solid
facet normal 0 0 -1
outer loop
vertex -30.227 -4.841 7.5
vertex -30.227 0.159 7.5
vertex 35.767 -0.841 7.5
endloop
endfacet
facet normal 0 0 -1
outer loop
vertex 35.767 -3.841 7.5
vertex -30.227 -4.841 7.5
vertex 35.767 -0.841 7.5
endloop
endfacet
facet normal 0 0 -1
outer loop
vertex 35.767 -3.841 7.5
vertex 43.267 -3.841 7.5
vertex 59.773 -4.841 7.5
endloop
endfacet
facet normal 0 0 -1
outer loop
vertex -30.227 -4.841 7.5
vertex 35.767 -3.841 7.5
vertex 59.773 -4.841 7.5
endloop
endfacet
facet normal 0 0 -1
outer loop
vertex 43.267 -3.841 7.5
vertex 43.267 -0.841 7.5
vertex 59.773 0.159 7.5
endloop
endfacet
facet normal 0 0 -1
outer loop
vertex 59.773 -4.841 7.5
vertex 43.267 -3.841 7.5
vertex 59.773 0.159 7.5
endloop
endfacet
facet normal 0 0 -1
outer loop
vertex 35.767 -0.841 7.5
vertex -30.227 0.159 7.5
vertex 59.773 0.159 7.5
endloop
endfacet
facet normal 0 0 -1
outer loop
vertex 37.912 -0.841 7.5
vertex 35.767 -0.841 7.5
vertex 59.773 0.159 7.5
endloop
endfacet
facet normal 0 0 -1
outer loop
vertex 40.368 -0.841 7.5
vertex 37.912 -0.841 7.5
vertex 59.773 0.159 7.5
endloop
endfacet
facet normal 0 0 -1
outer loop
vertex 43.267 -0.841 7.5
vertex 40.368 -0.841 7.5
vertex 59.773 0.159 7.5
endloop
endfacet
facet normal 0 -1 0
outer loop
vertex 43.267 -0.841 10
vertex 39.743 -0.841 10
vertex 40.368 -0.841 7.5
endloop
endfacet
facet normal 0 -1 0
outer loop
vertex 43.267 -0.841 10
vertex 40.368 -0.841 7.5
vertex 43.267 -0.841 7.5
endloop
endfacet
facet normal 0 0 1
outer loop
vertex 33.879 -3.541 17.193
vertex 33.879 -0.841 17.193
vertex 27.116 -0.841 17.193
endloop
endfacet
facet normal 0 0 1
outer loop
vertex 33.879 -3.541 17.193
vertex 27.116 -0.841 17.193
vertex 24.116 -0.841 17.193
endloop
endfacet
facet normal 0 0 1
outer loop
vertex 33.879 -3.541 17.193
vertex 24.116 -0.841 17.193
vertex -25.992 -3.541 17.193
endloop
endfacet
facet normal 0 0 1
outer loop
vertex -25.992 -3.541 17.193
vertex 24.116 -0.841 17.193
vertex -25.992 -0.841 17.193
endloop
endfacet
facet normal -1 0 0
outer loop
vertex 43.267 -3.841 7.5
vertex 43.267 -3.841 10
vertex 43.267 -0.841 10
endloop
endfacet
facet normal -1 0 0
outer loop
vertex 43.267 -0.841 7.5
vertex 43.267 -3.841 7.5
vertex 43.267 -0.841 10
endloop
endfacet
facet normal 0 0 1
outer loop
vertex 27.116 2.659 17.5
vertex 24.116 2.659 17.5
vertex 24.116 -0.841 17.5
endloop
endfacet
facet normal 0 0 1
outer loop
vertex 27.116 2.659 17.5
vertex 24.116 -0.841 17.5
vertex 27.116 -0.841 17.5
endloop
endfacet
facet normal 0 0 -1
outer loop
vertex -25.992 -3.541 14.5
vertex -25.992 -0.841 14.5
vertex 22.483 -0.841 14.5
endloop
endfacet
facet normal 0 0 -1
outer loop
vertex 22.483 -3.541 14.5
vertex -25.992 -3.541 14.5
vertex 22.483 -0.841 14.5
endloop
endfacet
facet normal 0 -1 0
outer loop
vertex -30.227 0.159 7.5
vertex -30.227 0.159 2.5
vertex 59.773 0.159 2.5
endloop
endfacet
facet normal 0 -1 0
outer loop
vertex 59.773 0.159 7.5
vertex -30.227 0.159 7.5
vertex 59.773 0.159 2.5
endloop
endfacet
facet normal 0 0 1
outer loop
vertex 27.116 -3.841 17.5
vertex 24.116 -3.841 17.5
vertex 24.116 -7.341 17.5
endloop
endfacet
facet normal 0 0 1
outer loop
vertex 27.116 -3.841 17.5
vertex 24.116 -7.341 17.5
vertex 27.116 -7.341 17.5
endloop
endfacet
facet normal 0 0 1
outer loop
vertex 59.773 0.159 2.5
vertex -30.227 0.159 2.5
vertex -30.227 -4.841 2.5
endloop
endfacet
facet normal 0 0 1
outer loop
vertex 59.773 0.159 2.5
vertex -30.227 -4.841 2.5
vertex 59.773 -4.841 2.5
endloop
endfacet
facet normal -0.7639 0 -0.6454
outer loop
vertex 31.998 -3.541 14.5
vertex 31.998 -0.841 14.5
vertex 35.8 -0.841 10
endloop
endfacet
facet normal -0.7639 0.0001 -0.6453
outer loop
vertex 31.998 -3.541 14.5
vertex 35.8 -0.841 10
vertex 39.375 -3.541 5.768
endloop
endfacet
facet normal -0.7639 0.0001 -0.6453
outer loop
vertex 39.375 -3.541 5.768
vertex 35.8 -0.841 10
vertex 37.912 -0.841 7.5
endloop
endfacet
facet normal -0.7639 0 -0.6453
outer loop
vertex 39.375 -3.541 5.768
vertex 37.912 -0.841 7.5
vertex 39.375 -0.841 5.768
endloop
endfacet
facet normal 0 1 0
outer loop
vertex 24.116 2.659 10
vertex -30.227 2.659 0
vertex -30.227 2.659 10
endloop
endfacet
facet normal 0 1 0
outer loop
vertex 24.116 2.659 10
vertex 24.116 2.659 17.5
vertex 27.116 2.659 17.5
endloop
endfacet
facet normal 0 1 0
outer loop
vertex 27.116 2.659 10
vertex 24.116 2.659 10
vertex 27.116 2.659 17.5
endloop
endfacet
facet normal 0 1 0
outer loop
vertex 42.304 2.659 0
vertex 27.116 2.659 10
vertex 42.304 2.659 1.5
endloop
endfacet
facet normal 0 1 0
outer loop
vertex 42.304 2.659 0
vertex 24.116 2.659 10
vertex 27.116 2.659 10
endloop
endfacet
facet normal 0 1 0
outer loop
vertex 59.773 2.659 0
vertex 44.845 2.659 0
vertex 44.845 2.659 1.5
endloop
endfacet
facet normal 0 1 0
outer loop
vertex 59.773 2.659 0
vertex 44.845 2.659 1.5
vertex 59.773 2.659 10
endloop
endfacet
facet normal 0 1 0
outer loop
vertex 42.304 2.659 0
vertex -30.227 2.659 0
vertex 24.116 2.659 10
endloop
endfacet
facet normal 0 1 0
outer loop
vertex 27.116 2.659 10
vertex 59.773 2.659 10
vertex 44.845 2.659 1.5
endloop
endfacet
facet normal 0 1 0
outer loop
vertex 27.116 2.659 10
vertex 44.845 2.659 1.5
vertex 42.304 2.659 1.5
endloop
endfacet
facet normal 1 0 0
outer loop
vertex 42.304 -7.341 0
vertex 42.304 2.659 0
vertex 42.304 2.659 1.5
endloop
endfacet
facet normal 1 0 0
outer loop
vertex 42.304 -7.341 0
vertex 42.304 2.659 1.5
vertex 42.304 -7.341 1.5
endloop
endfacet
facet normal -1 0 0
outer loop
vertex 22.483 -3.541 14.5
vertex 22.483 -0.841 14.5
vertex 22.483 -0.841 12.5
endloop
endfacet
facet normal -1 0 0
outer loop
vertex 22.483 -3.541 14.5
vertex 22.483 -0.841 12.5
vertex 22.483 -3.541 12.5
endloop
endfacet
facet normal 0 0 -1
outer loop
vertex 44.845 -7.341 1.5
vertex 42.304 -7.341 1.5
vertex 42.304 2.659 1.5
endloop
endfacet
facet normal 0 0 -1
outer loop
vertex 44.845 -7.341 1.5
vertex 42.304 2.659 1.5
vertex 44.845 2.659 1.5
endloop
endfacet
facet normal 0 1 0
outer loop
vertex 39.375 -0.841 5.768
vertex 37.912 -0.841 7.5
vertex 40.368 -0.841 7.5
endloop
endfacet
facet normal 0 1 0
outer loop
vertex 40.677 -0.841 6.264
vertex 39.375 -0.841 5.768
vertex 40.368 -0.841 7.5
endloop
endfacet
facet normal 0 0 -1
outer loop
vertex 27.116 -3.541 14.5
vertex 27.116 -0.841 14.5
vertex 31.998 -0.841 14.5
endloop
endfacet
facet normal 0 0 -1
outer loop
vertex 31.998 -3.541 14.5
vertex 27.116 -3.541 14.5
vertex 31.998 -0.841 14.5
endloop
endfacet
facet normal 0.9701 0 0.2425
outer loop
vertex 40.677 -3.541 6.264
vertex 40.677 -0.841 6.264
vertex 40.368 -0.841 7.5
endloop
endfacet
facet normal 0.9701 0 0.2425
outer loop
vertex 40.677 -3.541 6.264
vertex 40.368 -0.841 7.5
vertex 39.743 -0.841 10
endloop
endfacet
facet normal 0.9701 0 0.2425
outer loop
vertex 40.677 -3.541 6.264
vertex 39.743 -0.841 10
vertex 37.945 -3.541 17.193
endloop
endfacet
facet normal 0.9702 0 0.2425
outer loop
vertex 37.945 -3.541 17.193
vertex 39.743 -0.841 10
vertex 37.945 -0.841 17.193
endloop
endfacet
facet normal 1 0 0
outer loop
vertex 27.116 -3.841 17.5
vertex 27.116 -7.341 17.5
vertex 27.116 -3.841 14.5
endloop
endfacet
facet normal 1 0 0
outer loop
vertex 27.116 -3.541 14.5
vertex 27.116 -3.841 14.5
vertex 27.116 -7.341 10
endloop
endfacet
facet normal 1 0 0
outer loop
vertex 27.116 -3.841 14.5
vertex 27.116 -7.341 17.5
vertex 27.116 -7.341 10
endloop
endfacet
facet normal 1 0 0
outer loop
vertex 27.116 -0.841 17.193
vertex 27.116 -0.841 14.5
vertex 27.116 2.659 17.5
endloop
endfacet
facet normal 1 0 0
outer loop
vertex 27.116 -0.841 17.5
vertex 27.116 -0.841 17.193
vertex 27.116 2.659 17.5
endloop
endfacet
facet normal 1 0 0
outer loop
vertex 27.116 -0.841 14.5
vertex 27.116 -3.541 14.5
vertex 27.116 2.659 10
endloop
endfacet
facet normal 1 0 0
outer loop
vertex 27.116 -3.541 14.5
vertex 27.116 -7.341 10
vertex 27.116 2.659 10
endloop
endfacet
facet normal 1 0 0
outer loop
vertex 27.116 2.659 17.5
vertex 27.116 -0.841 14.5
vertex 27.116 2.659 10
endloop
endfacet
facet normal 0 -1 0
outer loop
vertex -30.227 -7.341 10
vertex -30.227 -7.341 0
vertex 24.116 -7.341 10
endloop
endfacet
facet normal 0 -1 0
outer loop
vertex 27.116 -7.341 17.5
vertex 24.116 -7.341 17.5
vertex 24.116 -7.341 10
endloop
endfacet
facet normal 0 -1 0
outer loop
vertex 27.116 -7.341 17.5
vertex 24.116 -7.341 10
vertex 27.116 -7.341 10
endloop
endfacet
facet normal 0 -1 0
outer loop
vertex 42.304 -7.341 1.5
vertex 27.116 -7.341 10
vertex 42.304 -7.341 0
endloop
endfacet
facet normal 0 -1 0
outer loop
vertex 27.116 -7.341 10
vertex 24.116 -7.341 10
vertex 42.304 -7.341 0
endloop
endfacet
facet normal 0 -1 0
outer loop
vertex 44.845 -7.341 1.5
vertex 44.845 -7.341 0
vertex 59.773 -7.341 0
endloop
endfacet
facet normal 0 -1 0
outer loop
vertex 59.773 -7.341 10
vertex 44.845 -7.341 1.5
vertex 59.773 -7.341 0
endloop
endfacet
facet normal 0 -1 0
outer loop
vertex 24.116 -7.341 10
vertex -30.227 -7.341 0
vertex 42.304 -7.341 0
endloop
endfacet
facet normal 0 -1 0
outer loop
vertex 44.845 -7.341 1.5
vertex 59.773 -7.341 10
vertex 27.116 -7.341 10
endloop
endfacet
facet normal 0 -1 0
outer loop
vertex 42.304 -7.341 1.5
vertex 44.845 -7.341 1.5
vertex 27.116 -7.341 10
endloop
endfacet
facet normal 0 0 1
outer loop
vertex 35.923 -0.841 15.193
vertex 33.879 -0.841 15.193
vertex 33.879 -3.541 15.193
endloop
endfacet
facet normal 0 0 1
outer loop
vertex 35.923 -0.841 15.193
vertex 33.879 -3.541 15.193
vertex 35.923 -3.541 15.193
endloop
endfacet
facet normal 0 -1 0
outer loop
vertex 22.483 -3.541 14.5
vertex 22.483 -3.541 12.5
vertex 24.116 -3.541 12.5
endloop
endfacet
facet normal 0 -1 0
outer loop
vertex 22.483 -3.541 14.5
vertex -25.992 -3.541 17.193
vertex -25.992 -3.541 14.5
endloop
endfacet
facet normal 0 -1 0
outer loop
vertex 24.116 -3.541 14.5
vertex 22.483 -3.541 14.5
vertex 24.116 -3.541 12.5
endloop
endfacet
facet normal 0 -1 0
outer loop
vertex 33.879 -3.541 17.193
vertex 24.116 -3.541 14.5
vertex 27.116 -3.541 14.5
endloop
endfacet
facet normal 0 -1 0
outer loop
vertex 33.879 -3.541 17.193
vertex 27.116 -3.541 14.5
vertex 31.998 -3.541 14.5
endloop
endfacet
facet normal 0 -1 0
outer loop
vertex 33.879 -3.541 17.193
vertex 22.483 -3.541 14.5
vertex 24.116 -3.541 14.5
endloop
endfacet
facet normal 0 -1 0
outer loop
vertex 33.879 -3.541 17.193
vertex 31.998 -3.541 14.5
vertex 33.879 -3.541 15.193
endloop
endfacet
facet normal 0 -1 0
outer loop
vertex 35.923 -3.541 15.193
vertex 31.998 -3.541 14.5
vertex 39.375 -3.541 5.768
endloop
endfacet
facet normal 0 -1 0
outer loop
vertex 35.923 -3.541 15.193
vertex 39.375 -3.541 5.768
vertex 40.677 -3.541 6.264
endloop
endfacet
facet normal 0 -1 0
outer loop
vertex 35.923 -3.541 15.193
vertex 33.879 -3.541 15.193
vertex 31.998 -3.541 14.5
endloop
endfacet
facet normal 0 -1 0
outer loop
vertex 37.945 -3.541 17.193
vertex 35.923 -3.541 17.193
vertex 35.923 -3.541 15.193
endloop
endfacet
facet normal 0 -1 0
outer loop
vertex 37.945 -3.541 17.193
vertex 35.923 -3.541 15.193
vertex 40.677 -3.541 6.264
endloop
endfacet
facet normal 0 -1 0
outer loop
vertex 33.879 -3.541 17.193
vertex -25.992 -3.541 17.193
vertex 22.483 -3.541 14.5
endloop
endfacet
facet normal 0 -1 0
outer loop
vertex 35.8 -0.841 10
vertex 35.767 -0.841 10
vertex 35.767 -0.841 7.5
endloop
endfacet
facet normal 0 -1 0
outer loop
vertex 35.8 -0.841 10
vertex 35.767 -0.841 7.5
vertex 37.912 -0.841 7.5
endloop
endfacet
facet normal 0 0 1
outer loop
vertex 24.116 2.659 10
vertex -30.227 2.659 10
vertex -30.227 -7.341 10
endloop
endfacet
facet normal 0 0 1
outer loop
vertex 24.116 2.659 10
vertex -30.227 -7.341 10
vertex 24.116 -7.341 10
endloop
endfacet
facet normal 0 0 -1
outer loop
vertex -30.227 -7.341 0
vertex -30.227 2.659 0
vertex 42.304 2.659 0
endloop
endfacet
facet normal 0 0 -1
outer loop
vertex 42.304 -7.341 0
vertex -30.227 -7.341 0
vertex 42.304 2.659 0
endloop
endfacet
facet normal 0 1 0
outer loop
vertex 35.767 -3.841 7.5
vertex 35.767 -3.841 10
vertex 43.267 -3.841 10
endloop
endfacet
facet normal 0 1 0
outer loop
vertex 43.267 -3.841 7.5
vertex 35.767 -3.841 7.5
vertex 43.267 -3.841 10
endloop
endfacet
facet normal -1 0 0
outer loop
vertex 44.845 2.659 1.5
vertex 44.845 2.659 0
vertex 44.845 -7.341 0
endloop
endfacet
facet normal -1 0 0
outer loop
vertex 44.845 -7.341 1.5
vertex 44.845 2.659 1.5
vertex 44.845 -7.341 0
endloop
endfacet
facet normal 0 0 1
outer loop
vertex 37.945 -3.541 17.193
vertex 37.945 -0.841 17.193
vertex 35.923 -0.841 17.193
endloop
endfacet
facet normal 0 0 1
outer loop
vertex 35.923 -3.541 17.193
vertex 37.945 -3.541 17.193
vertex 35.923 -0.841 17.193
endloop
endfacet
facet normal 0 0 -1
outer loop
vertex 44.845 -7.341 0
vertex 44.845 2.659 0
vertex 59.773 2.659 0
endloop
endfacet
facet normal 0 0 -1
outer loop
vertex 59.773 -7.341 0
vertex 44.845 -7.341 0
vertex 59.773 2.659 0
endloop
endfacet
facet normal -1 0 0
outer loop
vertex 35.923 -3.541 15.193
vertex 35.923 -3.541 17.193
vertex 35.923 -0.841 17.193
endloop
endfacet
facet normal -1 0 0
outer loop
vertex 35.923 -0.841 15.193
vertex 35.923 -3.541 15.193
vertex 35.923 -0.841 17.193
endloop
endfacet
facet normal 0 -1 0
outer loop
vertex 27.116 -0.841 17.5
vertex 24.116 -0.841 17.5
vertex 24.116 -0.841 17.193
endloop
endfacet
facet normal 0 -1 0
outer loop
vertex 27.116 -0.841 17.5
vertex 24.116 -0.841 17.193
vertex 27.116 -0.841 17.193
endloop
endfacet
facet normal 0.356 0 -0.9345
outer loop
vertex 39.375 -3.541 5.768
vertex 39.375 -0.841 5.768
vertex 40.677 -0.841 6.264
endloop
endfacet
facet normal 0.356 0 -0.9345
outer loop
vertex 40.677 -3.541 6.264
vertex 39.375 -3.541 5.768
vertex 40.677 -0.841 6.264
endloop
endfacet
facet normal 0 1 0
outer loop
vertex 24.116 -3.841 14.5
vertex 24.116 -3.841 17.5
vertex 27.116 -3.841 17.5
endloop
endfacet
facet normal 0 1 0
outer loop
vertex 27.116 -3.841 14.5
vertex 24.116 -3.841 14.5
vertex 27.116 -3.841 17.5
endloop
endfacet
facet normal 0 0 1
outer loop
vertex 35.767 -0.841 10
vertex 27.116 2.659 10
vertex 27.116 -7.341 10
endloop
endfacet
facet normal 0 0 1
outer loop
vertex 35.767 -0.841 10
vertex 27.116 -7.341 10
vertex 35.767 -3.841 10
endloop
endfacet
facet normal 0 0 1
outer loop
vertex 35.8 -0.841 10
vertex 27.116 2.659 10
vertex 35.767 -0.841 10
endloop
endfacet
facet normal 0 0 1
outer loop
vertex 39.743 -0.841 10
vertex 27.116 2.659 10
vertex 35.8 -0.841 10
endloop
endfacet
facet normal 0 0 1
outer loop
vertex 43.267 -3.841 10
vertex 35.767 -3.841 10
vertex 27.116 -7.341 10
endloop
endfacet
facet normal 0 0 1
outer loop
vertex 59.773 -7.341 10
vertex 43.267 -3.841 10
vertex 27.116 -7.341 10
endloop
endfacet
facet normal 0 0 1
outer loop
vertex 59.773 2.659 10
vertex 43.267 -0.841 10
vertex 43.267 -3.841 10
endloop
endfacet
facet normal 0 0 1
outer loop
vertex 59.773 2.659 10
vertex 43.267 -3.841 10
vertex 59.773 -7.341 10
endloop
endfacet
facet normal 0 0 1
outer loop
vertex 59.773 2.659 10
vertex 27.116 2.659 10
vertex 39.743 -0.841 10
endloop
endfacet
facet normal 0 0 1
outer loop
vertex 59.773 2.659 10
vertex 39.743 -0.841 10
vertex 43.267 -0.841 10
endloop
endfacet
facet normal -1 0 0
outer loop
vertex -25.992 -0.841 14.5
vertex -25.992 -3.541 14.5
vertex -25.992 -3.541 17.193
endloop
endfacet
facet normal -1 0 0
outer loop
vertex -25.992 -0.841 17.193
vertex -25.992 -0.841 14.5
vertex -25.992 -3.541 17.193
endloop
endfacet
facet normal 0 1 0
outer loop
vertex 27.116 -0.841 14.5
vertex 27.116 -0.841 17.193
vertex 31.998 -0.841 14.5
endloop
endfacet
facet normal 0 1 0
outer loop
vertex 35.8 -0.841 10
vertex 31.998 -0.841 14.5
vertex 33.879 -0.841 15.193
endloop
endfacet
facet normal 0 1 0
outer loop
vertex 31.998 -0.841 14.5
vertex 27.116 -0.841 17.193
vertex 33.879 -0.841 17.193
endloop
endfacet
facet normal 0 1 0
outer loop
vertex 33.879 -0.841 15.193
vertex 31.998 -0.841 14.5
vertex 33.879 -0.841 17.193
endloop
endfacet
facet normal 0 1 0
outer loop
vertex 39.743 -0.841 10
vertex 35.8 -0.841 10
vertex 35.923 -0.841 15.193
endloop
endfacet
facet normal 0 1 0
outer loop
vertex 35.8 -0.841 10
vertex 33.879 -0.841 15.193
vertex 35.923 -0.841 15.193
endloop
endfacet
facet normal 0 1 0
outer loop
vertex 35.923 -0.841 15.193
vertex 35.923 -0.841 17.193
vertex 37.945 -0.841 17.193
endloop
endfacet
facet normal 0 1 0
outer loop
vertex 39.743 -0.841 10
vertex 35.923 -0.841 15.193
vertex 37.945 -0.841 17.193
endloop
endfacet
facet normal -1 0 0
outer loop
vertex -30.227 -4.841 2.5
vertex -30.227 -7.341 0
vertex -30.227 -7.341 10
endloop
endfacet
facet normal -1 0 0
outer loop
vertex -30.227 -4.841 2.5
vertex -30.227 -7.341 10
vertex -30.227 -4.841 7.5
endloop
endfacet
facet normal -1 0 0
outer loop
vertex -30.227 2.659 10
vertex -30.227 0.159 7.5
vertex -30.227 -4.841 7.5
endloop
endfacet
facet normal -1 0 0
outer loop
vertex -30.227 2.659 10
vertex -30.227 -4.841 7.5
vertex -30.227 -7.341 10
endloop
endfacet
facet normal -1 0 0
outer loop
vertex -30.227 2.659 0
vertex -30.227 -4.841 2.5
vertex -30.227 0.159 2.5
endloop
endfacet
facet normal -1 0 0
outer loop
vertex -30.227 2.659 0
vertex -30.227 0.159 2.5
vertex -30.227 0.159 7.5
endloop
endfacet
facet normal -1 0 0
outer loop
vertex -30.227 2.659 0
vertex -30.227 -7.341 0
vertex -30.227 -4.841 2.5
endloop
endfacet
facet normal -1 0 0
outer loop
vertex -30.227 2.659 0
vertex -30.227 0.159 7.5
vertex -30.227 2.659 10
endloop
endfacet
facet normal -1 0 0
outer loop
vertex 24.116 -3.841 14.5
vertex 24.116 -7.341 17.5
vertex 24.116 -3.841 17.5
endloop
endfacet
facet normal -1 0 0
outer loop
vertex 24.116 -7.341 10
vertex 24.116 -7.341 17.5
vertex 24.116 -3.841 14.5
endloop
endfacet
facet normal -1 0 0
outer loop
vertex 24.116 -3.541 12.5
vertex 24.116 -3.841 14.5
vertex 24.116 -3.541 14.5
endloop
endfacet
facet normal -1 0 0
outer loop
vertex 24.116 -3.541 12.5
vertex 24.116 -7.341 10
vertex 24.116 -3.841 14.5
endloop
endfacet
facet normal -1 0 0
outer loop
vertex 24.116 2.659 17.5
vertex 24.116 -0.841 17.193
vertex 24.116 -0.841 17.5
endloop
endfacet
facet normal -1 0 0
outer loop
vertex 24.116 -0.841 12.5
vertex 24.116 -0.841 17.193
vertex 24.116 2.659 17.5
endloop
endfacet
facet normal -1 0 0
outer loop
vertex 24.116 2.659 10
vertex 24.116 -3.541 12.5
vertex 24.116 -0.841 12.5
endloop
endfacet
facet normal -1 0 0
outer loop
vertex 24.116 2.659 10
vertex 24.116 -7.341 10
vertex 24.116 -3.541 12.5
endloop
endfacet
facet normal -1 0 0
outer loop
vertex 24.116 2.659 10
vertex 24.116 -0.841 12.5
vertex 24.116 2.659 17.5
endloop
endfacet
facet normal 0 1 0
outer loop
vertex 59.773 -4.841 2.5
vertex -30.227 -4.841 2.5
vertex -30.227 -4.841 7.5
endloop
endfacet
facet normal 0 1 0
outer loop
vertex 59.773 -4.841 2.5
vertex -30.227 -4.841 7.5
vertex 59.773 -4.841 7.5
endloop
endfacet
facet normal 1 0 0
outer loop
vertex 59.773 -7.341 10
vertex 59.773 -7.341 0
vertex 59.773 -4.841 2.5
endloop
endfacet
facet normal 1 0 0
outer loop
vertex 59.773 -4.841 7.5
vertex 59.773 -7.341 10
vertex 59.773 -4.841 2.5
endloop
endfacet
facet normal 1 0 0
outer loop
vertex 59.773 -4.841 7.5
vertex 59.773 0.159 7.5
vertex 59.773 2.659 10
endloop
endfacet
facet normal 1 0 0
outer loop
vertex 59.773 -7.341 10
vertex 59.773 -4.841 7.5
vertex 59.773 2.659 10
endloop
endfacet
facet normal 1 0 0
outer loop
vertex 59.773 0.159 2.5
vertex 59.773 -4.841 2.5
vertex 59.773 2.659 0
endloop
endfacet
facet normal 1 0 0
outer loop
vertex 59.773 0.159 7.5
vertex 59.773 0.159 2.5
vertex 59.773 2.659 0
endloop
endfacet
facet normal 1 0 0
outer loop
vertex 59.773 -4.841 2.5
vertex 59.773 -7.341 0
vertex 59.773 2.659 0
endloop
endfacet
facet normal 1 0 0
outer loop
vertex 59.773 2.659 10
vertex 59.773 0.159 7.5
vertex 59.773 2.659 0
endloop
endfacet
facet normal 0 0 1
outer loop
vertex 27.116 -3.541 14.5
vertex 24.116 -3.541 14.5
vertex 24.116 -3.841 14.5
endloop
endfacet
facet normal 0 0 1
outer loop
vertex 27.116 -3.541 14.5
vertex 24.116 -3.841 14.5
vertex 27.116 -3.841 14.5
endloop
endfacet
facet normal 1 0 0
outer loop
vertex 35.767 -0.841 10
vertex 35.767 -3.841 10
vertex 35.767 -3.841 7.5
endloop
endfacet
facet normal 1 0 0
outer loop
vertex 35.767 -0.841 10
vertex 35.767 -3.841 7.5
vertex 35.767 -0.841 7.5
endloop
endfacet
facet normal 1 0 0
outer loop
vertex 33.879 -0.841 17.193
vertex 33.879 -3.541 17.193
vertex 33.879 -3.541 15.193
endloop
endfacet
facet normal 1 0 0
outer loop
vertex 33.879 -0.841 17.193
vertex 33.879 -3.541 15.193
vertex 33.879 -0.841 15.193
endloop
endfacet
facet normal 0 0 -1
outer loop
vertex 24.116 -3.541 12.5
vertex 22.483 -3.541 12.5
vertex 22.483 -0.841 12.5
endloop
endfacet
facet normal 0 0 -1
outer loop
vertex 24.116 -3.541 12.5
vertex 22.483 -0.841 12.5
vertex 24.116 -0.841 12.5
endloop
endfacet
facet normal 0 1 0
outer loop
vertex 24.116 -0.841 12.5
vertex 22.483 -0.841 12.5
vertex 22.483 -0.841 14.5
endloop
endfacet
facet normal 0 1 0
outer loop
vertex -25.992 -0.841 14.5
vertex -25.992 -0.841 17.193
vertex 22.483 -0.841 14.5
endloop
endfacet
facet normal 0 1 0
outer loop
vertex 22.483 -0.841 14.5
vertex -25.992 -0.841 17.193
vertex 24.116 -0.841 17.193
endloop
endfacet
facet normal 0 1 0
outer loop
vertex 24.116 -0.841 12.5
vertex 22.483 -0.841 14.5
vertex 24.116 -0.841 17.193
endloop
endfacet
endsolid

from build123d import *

# Parameters (mm, degrees)
F0_W      = 90
F0_H      = 10
F1_DEPTH  = 10
F2_T      = -2.5
F3_W      = 7.5
F3_H      = 3
F4_DEPTH  = 2.5
F5_W      = 3
F5_H      = 10
F6_DEPTH  = 7.5
F7_W      = 3
F7_H      = 3
F8_DEPTH  = 3
F9_W      = 3
F9_H      = 2.6932093799
F9_W_2    = 50.1080509275
F10_DEPTH = 2.7
F11_W     = 1.6326196492
F11_H     = 2.7
F12_DEPTH = 2
F13_W     = 2.0434856415
F13_H     = 2.7
F14_DEPTH = 2
F15_W     = 2.5415048003
F15_H     = 10
F16_DEPTH = 1.5


with BuildPart() as f1:
    # F0 (on Top) → F1 (new body)
    with BuildSketch(Plane.XY):
        with Locations((14.7734600306, -2.3407222517)):
            Rectangle(F0_W, F0_H)
    extrude(amount=F1_DEPTH)

    # F2
    f2_openings = [f1.faces().sort_by_distance(p)[0] for p in [
        (59.77346, -2.340722, 5),
        (-30.22654, -2.340722, 5),
    ]]
    offset(amount=F2_T, openings=f2_openings)

    # F3 (on face) → F4 (cut, through all)
    with BuildSketch(Plane.XY.offset(10)):
        with Locations((39.5166127384, -2.3407222517)):
            Rectangle(F3_W, F3_H)
    extrude(amount=-F4_DEPTH, mode=Mode.SUBTRACT)

    # F5 (on face) → F6 (join)
    with BuildSketch(Plane.XY.offset(10)):
        with Locations((25.6160299629, -2.3407222517)):
            Rectangle(F5_W, F5_H)
    extrude(amount=F6_DEPTH)

    # F7 (on face) → F8 (cut)
    with BuildSketch(Plane.XY.offset(17.5)):
        with Locations((25.6160299629, -2.3407222517)):
            Rectangle(F7_W, F7_H)
    extrude(amount=-F8_DEPTH, mode=Mode.SUBTRACT)

    # F9 (on face) → F10 (join)
    with BuildSketch(Plane.XZ.offset(0.8407222517)):
        Polygon((27.1160299629, 14.5), (31.9977998734, 14.5), (39.3753573298, 5.7678297162), (40.6771413982, 6.2636667863), (37.9447564483, 17.1932093799), (27.1160299629, 17.1932093799), align=None)
        with Locations((25.6160299629, 15.84660469)):
            Rectangle(F9_W, F9_H)
        with Locations((-0.9379955009, 15.84660469)):
            Rectangle(F9_W_2, F9_H)
    extrude(amount=F10_DEPTH)

    # F11 (on face) → F12 (join)
    with BuildSketch(Plane(origin=(0, 0, 14.5), x_dir=(1, 0, 0), z_dir=(0, 0, -1))):
        with Locations((23.2997201383, 2.1907222517)):
            Rectangle(F11_W, F11_H)
    extrude(amount=F12_DEPTH)

    # F13 (on face) → F14 (cut)
    with BuildSketch(Plane.XY.offset(17.1932093799)):
        with Locations((34.9011048675, -2.1907222517)):
            Rectangle(F13_W, F13_H)
    extrude(amount=-F14_DEPTH, mode=Mode.SUBTRACT)

    # F15 (on face) → F16 (cut)
    with BuildSketch(Plane(origin=(0, 0, 0), x_dir=(1, 0, 0), z_dir=(0, 0, -1))):
        with Locations((43.5744747519, 2.3407222517)):
            Rectangle(F15_W, F15_H)
    extrude(amount=-F16_DEPTH, mode=Mode.SUBTRACT)


solid = f1.part
